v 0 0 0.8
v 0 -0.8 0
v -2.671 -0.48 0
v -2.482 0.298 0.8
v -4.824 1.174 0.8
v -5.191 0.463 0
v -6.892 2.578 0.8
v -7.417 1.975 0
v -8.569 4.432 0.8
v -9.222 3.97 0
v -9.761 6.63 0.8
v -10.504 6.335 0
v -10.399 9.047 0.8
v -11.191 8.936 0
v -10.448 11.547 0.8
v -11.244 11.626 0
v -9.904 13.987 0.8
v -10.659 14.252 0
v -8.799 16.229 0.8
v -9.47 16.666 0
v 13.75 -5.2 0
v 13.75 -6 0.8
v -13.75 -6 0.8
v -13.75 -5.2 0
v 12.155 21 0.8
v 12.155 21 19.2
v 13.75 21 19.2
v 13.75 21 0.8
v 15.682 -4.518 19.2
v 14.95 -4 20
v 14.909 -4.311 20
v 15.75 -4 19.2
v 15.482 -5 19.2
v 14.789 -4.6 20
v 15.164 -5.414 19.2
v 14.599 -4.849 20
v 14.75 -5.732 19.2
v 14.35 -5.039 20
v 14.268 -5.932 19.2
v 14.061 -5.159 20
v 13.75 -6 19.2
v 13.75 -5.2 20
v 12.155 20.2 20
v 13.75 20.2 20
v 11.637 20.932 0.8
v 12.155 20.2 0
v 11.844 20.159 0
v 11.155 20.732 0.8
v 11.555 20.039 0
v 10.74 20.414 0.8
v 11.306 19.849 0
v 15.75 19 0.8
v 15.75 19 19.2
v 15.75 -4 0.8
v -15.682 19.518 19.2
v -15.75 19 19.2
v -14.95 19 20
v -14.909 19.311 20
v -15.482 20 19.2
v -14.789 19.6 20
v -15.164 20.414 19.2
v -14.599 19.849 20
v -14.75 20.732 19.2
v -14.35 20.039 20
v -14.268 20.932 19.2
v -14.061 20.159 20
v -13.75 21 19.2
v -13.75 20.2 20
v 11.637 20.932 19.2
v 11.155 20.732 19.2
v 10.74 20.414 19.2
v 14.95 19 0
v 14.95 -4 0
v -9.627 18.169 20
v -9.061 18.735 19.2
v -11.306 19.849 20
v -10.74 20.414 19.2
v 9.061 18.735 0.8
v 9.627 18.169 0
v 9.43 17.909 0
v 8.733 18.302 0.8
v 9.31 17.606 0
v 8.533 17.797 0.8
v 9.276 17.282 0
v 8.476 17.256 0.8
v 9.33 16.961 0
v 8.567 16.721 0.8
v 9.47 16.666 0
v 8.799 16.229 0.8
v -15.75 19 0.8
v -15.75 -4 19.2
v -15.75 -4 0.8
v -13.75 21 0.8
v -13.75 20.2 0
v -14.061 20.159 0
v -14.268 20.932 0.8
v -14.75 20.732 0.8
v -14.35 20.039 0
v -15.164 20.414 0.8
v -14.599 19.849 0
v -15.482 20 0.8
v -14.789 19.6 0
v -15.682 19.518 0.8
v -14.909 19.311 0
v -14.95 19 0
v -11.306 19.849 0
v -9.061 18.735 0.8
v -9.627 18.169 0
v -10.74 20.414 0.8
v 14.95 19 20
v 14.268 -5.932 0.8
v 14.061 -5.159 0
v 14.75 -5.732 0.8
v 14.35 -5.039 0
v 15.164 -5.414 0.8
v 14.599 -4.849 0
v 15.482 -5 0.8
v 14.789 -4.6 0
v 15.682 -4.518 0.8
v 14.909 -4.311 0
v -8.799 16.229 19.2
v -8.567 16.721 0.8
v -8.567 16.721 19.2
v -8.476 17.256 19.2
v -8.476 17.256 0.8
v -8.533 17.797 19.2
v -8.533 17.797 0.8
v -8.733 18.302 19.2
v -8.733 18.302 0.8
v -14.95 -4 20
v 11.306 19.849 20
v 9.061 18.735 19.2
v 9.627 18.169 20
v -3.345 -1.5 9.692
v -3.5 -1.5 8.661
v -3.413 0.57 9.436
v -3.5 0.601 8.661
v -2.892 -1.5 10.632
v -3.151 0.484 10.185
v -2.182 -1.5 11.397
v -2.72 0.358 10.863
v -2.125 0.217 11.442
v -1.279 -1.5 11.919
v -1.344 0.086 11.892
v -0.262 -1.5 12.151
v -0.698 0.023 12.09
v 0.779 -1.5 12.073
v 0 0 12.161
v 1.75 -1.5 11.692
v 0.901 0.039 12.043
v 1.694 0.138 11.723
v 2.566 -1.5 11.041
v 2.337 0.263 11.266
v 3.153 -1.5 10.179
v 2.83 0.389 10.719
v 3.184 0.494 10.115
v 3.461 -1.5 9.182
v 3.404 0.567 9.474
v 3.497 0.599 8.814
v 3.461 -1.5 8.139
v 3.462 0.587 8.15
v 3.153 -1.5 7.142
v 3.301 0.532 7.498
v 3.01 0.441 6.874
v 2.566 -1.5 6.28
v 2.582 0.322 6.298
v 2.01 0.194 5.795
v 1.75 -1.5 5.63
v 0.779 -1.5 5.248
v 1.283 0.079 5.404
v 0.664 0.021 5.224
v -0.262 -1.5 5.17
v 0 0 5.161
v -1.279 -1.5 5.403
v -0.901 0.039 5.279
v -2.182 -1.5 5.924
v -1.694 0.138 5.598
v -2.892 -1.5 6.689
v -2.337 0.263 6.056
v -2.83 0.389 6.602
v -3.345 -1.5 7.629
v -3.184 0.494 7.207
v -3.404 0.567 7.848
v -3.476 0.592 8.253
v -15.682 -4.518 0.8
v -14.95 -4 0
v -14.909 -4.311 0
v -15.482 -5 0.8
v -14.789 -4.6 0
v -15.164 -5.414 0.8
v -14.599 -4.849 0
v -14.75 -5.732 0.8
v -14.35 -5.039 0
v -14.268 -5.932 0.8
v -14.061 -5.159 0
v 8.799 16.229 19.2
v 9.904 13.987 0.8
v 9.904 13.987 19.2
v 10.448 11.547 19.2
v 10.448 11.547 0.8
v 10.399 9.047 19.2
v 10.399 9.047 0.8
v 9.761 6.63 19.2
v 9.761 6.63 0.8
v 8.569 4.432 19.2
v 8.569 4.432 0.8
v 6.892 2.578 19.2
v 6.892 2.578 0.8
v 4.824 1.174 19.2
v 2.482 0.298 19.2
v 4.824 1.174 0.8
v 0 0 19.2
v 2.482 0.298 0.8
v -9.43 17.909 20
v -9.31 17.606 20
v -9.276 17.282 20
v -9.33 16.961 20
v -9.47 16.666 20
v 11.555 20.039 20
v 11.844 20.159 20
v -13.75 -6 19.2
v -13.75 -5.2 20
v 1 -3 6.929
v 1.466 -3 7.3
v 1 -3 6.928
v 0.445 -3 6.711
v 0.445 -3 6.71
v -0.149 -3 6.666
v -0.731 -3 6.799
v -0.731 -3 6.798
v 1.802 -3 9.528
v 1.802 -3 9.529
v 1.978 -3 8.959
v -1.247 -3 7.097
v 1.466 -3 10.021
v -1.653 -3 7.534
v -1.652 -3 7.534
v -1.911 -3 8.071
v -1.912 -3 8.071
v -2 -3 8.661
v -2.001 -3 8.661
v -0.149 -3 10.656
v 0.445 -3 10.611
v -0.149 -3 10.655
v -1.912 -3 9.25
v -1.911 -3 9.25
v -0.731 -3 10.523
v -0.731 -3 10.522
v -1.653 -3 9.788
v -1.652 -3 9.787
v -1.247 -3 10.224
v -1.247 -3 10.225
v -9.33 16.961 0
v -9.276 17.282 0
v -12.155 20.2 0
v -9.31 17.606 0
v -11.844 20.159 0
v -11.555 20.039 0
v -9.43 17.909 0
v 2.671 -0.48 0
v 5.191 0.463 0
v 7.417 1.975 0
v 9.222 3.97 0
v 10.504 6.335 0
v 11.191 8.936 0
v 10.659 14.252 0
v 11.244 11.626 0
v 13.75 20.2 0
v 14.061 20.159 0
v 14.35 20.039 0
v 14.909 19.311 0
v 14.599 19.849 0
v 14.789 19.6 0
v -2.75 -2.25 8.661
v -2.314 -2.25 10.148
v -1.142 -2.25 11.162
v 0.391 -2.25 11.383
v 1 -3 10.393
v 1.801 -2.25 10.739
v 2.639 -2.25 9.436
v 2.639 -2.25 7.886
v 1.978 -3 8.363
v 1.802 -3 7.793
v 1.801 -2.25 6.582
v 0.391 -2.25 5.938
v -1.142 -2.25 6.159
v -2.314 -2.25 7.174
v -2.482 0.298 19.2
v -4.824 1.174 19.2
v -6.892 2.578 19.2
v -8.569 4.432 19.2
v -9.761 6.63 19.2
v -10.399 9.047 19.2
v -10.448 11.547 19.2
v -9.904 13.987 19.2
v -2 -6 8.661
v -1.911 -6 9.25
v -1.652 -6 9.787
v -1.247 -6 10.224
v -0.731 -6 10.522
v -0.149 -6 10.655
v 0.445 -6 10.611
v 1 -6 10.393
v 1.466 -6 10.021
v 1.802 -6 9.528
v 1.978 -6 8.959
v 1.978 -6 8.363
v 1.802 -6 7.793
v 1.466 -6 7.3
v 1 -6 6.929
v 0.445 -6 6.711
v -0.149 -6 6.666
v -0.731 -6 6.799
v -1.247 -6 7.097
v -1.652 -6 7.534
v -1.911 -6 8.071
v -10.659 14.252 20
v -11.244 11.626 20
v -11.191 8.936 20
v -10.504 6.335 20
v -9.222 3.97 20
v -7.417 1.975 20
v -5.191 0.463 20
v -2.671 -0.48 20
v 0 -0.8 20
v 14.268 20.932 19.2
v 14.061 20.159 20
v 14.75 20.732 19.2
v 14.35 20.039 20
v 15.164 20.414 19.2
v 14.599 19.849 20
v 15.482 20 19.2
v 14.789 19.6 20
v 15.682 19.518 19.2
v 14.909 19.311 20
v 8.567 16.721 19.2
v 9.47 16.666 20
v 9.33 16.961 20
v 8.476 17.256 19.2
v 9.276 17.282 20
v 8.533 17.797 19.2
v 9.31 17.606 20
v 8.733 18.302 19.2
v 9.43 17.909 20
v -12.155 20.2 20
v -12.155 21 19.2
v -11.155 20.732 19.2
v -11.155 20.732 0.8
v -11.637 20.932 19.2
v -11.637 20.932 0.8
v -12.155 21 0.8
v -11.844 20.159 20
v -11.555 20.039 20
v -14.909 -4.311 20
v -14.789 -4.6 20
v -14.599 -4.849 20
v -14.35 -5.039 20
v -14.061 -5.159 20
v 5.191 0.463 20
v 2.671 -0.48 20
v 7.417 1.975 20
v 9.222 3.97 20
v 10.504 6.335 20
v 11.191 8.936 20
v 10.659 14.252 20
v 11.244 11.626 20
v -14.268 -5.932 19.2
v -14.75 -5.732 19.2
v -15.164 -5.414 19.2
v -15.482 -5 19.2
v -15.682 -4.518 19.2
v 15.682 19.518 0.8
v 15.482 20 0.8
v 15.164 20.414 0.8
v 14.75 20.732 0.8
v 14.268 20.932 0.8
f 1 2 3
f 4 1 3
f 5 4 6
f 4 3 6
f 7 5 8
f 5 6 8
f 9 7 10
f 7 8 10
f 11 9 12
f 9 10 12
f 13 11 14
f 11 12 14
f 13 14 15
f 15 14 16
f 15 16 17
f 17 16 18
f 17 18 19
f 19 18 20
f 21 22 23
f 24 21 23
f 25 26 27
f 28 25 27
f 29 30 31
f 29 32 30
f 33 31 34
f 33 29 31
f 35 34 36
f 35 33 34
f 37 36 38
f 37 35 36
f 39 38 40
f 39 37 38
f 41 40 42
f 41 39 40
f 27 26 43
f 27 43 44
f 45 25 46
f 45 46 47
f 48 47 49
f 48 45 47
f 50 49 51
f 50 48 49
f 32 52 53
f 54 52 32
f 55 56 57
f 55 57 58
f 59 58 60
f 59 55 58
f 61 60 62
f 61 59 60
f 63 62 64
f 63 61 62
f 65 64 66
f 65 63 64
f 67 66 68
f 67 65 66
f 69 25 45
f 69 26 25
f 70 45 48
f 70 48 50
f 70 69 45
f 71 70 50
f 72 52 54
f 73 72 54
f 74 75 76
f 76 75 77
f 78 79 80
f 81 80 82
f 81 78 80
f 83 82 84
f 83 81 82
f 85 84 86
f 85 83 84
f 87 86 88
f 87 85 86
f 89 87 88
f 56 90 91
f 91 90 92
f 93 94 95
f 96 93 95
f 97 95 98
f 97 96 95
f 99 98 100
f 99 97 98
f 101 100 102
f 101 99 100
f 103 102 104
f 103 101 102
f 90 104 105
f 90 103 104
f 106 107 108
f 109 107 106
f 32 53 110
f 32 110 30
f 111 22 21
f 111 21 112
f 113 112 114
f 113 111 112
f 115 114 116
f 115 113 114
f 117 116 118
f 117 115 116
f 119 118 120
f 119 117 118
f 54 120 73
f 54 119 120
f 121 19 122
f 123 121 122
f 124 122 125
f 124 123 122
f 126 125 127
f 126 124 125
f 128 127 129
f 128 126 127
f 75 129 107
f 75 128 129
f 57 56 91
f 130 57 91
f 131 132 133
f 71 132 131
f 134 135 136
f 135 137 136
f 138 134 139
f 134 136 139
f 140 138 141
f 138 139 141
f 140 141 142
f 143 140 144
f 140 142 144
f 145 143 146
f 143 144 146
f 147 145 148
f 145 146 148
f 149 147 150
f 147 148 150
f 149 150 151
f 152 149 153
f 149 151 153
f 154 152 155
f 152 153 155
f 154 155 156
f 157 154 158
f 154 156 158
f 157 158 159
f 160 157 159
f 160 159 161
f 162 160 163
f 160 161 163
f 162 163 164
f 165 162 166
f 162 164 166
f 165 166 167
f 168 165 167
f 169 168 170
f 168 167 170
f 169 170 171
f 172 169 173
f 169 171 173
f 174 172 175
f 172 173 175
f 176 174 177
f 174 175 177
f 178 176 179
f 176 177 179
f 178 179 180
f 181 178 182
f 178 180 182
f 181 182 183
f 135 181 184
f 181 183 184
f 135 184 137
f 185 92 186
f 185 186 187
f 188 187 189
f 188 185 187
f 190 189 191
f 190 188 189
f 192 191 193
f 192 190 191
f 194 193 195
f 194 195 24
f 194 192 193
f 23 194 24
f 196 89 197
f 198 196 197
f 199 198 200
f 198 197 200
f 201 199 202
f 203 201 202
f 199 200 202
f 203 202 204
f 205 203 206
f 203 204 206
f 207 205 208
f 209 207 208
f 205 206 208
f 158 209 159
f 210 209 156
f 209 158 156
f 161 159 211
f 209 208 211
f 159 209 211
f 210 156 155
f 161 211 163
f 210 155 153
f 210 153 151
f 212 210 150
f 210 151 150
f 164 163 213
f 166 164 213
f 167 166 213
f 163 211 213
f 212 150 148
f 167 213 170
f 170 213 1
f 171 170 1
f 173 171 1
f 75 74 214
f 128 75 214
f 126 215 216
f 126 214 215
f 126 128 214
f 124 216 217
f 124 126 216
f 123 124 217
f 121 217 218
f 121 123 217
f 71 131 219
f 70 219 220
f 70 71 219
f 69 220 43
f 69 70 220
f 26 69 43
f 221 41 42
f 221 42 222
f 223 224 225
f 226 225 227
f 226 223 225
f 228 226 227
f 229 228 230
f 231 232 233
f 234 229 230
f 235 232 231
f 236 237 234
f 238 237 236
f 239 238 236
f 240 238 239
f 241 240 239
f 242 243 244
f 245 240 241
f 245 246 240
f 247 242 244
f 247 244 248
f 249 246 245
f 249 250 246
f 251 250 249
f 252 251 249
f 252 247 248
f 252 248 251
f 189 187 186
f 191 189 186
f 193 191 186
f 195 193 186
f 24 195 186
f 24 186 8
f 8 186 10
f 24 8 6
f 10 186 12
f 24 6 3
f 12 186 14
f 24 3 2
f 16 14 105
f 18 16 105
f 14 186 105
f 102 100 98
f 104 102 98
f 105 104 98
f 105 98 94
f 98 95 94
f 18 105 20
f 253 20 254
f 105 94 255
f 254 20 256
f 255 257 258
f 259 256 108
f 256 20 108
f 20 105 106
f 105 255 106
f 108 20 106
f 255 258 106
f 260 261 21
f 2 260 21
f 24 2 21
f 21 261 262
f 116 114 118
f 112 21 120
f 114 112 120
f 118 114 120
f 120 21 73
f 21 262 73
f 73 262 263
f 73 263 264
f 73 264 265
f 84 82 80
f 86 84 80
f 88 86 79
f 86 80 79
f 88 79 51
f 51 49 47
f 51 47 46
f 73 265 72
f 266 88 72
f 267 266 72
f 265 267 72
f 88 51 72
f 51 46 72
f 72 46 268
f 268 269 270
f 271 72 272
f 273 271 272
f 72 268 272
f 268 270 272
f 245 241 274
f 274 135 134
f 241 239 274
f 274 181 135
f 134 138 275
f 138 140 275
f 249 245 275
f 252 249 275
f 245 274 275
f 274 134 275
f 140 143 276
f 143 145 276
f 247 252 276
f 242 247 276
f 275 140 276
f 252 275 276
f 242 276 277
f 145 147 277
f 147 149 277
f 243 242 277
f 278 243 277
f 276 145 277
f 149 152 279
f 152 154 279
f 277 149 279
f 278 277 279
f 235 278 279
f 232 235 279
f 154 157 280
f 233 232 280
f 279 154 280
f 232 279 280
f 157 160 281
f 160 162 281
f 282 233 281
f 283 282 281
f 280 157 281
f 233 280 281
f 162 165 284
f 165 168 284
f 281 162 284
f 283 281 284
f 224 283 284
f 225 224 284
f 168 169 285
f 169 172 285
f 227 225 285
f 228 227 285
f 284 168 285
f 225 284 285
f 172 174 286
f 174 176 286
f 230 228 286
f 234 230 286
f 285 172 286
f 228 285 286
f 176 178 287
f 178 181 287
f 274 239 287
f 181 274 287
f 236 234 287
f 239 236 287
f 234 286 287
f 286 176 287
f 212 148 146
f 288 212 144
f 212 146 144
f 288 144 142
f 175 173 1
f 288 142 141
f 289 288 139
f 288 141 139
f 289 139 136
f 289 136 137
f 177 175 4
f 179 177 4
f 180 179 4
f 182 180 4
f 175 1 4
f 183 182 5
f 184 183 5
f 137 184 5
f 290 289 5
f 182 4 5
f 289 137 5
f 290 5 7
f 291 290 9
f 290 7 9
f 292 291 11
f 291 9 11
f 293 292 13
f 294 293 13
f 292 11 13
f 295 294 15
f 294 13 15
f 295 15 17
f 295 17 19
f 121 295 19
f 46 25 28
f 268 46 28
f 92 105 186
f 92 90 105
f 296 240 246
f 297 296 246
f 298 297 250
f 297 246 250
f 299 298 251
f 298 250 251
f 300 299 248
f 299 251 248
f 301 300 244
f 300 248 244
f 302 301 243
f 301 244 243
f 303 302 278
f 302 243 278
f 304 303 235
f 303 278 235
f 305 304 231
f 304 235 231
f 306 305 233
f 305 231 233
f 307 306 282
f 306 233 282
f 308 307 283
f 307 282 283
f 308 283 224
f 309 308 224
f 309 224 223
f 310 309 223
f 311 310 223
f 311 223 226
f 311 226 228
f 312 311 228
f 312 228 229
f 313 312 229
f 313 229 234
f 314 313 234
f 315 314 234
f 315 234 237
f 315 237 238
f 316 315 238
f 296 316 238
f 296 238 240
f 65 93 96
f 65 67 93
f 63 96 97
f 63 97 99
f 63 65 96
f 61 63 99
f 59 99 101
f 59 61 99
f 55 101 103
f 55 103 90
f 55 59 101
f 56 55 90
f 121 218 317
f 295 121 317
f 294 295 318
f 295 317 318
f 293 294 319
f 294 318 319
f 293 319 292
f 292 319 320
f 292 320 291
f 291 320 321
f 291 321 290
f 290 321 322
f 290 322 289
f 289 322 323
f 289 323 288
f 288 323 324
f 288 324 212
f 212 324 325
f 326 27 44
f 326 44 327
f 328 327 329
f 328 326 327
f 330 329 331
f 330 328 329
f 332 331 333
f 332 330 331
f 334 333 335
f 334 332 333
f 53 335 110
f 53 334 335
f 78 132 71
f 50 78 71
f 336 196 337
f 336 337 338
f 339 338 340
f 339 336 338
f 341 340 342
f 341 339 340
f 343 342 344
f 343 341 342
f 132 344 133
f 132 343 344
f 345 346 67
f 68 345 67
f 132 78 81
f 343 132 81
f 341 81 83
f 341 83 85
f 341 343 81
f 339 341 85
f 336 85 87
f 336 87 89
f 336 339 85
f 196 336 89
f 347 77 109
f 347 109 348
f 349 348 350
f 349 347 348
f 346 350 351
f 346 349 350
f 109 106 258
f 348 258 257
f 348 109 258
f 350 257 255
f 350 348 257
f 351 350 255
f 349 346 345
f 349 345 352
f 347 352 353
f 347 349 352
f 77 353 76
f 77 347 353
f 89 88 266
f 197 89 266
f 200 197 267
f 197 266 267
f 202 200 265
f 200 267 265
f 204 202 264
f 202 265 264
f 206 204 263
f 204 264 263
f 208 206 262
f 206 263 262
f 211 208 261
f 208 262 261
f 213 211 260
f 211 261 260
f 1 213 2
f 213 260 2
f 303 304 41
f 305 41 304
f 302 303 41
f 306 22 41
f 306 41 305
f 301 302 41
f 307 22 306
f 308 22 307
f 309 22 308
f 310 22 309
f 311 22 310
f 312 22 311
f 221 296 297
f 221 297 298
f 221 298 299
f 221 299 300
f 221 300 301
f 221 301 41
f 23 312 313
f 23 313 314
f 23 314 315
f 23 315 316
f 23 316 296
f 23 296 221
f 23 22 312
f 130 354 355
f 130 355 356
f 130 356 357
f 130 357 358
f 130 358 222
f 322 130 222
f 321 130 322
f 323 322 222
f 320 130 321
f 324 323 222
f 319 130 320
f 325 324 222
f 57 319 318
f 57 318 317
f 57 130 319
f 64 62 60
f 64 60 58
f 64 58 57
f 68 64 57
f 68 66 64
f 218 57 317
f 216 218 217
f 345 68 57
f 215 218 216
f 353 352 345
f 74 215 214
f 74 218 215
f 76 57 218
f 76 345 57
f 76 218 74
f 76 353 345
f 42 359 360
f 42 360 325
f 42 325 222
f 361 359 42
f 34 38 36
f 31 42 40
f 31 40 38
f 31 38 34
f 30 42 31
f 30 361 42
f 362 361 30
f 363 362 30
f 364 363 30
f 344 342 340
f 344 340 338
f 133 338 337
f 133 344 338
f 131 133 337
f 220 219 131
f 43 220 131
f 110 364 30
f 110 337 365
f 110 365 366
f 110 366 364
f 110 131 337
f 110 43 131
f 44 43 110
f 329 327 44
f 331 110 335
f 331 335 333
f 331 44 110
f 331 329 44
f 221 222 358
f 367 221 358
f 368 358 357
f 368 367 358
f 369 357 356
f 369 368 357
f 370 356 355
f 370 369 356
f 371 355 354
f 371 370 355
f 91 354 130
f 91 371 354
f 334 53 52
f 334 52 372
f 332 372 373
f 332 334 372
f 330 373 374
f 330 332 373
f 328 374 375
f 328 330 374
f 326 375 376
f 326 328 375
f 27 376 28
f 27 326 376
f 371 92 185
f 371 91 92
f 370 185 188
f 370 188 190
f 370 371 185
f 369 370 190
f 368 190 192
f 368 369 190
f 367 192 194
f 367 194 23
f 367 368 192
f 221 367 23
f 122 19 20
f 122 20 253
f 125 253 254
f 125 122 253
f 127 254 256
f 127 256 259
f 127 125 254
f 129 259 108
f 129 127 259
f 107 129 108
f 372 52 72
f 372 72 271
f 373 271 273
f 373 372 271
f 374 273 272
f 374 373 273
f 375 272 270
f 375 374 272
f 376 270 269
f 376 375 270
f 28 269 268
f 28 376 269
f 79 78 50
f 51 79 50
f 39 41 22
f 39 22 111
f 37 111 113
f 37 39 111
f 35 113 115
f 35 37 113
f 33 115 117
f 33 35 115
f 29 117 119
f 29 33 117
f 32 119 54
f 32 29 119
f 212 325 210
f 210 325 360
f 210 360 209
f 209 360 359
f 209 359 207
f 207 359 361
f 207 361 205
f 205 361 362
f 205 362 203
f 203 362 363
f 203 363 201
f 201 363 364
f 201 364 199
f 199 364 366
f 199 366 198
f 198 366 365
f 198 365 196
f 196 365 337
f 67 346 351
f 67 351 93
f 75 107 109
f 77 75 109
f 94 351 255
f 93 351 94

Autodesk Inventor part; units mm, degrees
ref_plane "YZ Plane" through (0, 0, 0) normal (1, 0, 0) x (0, 1, 0)
ref_plane "XZ Plane" through (0, 0, 0) normal (0, 1, 0) x (-1, 0, 0)
ref_plane "XY Plane" through (0, 0, 0) normal (0, 0, 1) x (1, 0, 0)
sketch "Sketch1" plane through (0, 0, 0) normal (0, 0, 1) x (1, 0, 0)
  arc A0 (0, 0) -> (7.8262, 17.5) centre (0, 10.5) ccw
  line L0 (0, 26.4) -> (0, -11.4) projected
  line L1 (-48.3956, 0) -> (48.6087, 0) projected
  line L2 (7.8262, 17.5) -> (11.3262, 21)
  line L3 (11.3262, 21) -> (15.75, 21)
  line L4 (15.75, 21) -> (15.75, -6)
  line L5 (15.75, -6) -> (0, -6)
  arc A1 (-7.8262, 17.5) -> (0, 0) centre (0, 10.5) ccw
  line L6 (48.3956, 0) -> (-48.6087, 0)
  line L7 (-7.8262, 17.5) -> (-11.3262, 21)
  line L8 (-11.3262, 21) -> (-15.75, 21)
  line L9 (-15.75, 21) -> (-15.75, -6)
  line L10 (-15.75, -6) -> (0, -6)
  dimension "d0" = 10.5
  dimension "d1" = 17.5
  dimension "d2" = 45
  dimension "d3" = 15.75
  dimension "d4" = 21
  dimension "d5" = 6
extrude "Extrusion1" add sketch "Sketch1" along normal blind 20
sketch "Sketch2" plane through (0, 0, 0) normal (0, 1, 0) x (-1, 0, 0)
  circle A0 centre (0, 8.6607) radius 2
  circle A1 centre (0, 8.6607) radius 3.5
  point P0 (0, 0)
  dimension "d8" = 7
  dimension "d9" = 4
extrude "Extrusion2" cut sketch "Sketch2" along normal through all both and the other way through all contours A0
extrude "Extrusion3" cut sketch "Sketch2" along normal blind 10 and the other way blind 3 contours A0 | A1
chamfer "Chamfer1" distance 1.5 angle 45 1 edges at (3.5, -3, 8.6607)
fillet "Fillet1" radius 2 8 edges at (-15.75, -6, 10) (15.75, -6, 10) (7.8262, 17.5, 10) (11.3262, 21, 10) (15.75, 21, 10) (-7.8262, 17.5, 10) (-11.3262, 21, 10) (-15.75, 21, 10)
chamfer "Chamfer2" distance 0.8 angle 45 32 edges at (-15.75, 7.5, 20) (-15.1642, -5.4142, 20) (0, -6, 20) (15.1642, -5.4142, 20) (15.75, 7.5, 20) (15.1642, 20.4142, 20) (12.9523, 21, 20) (11.3893, 20.8478, 20) (9.9007, 19.5745, 20) (8.486, 17.5284, 20) (0, 0, 20) (-8.486, 17.5284, 20) (-9.9007, 19.5745, 20) (-11.3893, 20.8478, 20) (-12.9523, 21, 20) (-15.1642, 20.4142, 20) (15.75, 7.5, 0) (15.1642, 20.4142, 0) (12.9523, 21, 0) (11.3893, 20.8478, 0) (9.9007, 19.5745, 0) (8.486, 17.5284, 0) (0, 0, 0) (-8.486, 17.5284, 0) (-9.9007, 19.5745, 0) (-11.3893, 20.8478, 0) (-12.9523, 21, 0) (-15.1642, 20.4142, 0) (-15.75, 7.5, 0) (-15.1642, -5.4142, 0) (0, -6, 0) (15.1642, -5.4142, 0)
equation "\"d1\" = 1.66667 * d0"
equation "\"d3\" = 1.5 * d0"
equation "\"d4\" = 2 * d0"
equation "\"D_Screw\" = 4"
equation "\"D_Screwhead\" = 6"
properties part number "_3DPrint"
